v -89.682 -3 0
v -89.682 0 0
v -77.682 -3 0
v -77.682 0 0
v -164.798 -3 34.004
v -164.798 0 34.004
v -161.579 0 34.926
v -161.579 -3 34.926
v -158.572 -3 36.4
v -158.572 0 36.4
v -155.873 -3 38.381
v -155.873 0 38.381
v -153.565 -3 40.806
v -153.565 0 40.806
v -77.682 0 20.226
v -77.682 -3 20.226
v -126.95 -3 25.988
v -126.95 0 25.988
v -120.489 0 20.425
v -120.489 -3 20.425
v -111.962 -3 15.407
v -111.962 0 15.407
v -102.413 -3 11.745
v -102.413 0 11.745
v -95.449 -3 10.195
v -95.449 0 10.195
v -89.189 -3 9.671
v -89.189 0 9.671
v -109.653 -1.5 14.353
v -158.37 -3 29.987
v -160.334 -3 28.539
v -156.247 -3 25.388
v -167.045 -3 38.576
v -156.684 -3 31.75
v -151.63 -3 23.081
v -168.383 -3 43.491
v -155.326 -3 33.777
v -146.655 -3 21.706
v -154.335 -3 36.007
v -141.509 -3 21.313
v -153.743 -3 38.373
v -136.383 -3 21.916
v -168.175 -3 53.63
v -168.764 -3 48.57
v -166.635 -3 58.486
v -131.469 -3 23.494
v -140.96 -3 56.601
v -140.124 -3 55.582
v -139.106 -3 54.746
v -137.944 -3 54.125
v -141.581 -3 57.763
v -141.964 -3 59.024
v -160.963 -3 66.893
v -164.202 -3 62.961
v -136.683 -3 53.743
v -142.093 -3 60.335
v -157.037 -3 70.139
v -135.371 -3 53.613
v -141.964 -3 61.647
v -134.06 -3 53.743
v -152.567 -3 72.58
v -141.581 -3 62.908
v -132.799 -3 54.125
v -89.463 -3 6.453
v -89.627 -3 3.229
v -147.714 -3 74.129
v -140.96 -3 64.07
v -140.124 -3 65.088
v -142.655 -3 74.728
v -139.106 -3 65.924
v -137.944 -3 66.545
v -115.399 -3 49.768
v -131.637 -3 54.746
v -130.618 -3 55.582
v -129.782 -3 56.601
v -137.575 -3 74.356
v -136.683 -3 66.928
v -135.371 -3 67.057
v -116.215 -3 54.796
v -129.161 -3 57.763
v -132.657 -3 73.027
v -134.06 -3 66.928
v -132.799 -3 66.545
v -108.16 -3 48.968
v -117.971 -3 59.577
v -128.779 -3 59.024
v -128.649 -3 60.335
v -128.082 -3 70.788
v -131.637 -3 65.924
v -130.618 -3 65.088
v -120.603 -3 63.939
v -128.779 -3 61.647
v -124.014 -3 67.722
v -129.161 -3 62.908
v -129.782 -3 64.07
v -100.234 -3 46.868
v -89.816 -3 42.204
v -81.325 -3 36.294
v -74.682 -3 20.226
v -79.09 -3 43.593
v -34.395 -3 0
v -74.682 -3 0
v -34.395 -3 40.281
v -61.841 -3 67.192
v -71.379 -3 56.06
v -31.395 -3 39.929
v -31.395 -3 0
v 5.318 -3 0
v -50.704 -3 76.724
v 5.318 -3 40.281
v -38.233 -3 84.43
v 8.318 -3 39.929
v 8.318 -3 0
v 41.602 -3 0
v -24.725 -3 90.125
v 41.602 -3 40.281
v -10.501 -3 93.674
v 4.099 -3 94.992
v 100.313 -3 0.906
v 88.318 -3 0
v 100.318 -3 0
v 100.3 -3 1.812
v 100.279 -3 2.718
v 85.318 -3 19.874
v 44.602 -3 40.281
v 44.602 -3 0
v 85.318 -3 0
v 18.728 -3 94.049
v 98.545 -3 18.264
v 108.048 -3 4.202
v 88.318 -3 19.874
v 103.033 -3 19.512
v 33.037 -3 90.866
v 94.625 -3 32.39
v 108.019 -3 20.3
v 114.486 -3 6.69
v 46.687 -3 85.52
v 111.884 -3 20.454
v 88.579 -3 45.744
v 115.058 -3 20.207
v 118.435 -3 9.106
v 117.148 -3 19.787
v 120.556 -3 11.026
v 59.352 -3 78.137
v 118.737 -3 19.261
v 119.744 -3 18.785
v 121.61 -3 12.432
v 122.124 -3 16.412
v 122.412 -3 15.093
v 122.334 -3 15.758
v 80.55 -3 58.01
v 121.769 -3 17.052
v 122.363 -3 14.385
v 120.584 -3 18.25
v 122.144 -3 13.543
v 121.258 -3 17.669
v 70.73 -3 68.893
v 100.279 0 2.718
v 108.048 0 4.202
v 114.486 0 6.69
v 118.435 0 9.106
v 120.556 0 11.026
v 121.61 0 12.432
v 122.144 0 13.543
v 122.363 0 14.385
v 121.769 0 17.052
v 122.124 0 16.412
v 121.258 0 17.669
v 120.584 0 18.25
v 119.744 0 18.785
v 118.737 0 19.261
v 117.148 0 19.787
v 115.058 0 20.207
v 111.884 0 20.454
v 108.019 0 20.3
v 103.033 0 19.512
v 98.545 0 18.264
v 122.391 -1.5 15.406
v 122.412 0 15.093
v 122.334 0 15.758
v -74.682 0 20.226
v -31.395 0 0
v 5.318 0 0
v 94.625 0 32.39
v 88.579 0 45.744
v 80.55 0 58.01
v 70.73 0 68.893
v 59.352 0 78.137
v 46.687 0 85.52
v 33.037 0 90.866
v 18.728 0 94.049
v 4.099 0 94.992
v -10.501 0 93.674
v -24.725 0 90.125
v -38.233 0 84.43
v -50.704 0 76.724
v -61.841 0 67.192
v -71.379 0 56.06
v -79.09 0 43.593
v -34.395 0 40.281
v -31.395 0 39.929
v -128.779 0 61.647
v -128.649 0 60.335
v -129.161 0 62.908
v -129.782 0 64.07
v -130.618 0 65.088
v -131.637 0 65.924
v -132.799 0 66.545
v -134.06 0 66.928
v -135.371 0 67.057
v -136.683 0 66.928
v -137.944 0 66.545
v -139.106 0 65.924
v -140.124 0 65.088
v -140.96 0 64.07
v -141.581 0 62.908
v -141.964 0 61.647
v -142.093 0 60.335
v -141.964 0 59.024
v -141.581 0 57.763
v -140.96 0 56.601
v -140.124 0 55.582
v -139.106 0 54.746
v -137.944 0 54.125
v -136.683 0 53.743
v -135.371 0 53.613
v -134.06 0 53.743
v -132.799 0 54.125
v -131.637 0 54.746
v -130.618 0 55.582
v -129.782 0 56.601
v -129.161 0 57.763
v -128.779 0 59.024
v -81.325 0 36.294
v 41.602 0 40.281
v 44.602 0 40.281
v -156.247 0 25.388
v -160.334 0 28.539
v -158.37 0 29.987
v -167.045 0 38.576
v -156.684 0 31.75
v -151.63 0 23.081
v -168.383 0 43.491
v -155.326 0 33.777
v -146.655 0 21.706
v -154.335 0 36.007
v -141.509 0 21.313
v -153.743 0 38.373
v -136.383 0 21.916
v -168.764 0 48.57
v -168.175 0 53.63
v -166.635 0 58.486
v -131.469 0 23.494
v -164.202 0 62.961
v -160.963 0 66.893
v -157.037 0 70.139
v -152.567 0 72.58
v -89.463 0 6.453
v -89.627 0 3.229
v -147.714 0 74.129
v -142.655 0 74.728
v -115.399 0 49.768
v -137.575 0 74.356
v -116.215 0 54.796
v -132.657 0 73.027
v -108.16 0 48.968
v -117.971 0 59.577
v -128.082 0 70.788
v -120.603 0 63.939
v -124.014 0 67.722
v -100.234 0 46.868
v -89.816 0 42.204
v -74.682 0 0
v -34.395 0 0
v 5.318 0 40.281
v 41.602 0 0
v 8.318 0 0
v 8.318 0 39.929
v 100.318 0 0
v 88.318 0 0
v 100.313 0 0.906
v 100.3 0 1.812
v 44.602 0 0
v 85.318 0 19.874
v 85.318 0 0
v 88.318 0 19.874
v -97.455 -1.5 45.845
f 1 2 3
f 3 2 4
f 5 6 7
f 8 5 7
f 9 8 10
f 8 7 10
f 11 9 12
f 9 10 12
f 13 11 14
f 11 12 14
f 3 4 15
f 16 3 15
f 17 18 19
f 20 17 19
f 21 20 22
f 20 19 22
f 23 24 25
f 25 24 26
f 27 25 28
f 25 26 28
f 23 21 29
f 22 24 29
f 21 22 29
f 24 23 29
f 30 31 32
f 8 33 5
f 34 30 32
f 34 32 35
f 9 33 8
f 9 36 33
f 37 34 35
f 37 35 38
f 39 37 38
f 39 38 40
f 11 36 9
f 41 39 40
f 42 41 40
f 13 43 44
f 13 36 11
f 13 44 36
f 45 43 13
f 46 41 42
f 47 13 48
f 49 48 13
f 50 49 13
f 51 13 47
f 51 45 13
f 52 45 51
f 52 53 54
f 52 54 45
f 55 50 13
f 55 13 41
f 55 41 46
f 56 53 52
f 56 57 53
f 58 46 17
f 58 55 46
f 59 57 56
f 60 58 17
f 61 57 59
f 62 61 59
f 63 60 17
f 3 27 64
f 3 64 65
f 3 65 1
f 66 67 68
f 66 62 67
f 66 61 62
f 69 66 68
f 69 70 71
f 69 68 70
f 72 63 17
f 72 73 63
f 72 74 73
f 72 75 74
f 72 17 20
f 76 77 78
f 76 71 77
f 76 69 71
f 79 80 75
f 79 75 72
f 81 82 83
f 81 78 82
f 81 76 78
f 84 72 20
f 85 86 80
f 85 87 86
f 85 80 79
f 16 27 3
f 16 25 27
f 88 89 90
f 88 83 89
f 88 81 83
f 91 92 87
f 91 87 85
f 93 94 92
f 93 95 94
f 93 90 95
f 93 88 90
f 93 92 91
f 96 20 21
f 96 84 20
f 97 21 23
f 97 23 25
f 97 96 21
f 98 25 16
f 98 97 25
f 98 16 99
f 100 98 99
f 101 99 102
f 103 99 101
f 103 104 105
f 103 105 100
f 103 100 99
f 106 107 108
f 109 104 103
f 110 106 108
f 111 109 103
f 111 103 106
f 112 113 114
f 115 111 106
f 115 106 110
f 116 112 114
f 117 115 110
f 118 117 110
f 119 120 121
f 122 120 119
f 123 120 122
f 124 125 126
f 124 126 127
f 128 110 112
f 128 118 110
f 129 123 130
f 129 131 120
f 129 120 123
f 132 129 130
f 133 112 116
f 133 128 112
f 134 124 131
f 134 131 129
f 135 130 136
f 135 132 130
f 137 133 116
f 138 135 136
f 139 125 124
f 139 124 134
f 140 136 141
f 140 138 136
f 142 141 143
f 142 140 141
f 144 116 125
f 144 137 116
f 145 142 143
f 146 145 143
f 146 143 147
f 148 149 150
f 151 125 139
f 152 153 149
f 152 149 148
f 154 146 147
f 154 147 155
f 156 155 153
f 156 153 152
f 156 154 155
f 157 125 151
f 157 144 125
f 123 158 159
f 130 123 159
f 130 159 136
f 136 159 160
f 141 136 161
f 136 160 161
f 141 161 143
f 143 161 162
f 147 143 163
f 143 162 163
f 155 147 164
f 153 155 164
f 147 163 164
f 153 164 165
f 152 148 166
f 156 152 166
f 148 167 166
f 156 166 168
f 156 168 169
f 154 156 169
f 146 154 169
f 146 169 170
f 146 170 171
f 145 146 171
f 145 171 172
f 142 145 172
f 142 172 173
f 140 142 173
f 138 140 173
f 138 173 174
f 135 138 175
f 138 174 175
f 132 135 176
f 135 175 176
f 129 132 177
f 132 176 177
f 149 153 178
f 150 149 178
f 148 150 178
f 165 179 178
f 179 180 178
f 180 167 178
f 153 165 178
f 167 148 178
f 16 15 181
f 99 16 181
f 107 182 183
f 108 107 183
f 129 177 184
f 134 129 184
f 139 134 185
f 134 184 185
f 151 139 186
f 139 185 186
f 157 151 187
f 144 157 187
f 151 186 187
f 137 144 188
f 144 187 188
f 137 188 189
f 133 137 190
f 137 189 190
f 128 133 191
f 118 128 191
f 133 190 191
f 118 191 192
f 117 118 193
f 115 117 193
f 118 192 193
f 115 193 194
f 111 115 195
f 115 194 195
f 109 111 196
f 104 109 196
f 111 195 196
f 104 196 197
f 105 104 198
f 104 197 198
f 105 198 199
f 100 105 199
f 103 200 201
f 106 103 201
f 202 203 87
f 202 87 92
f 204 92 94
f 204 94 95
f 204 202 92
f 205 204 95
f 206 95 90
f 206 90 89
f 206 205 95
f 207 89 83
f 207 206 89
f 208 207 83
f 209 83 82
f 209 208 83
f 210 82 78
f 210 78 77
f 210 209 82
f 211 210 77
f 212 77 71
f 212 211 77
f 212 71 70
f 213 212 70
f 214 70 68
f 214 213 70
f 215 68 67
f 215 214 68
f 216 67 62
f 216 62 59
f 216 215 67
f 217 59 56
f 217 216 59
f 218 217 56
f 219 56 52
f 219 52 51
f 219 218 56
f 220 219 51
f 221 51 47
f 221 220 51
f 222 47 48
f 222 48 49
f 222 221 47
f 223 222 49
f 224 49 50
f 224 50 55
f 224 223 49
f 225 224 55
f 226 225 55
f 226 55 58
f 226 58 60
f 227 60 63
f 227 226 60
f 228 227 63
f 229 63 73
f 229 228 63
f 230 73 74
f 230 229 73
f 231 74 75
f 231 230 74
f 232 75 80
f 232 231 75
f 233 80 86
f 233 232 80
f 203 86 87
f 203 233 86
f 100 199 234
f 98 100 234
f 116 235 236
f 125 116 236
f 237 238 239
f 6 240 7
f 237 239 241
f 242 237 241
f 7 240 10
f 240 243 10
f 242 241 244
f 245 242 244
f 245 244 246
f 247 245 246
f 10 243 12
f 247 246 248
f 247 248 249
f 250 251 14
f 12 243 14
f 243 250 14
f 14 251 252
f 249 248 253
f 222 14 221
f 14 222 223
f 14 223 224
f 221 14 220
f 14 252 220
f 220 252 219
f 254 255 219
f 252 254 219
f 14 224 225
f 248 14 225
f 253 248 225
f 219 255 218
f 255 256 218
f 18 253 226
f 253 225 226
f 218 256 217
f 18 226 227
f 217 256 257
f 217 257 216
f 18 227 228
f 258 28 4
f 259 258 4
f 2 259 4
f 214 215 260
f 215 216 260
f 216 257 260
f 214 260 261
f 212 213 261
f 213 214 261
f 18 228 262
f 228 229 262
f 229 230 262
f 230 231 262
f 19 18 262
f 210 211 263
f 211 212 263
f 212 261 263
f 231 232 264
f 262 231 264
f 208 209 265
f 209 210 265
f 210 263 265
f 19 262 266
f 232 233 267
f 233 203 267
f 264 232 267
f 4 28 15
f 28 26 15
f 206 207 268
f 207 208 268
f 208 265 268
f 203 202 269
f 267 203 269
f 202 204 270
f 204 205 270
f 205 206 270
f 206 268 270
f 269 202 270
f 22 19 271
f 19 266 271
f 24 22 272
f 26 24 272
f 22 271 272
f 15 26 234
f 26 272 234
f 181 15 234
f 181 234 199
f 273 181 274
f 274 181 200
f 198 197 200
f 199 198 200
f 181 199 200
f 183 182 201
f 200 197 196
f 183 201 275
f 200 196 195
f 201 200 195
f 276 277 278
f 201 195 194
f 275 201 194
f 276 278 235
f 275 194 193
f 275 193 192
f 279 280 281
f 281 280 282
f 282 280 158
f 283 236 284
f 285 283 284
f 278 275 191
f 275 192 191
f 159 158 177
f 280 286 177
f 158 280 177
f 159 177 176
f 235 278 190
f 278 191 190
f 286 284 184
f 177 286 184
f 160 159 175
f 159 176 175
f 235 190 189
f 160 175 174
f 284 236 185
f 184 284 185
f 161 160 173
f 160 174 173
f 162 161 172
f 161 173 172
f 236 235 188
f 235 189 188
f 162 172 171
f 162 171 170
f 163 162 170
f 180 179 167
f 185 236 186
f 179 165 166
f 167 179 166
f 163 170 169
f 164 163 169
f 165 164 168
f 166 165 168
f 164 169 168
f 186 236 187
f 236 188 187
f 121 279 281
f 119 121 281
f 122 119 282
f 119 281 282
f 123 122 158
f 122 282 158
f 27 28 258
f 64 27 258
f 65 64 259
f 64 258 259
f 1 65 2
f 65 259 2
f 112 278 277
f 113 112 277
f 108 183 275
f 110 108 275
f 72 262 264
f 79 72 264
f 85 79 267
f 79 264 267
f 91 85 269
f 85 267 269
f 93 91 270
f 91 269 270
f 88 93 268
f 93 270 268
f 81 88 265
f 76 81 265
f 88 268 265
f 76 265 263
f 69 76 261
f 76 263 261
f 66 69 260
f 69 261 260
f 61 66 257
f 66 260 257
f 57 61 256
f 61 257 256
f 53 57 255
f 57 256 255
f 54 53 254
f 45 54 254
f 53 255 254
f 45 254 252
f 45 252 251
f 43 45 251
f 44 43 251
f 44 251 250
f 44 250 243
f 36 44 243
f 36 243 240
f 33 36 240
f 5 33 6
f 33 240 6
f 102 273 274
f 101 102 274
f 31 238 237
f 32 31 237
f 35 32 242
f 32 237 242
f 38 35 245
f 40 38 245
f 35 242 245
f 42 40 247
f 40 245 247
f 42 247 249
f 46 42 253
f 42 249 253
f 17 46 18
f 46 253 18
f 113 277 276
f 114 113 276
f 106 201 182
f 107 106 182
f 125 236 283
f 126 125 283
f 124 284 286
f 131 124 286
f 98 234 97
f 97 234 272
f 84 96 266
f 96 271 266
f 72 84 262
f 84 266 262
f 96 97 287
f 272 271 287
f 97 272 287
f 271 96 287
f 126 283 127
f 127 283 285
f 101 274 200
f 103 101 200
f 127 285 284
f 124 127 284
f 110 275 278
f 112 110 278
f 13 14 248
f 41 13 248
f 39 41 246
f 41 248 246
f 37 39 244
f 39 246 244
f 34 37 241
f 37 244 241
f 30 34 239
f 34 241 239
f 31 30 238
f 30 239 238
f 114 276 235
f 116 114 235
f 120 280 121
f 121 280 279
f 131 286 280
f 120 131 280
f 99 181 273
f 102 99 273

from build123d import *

# Parameters (mm, degrees)
F0_R     = 6.7218070384
F1_DEPTH = 3


with BuildPart() as f1:
    # F0 (on Front) → F1 (new body)
    with BuildSketch(Plane.XZ):
        with BuildLine():
            Line((88.3177022776, 0), (100.3177022776, 0))
            ThreePointArc((100.3177022776, 0), (100.3079795638, 1.3591251166), (100.2788134127, 2.7179720356))
            add(Edge.make_bspline(
                [(100.2788134127, 2.7179720356), (123.5657655158, 4.8702892654), (122.3910548507, 15.4061085671), (121.2163441856, 25.9419278688), (98.5454256048, 18.264490226)],
                knots=[4.3938313667, 4.3938313667, 4.3938313667, 6.2299356796, 6.2299356796, 8.0660399925, 8.0660399925, 8.0660399925], degree=2, weights=[1, 0.6073687139, 1, 0.6073687139, 1]))
            ThreePointArc((98.5454256048, 18.264490226), (18.727568812, 94.0487930785), (-79.0901933214, 43.5925126662))
            Line((-79.0901933214, 43.5925126662), (-81.324518094, 36.2935284559))
            add(Edge.make_bspline(
                [(-81.324518094, 36.2935284559), (-96.3555456344, 49.2548917985), (-115.3992575195, 49.7675132019)],
                knots=[1.0171703019, 1.0171703019, 1.0171703019, 2.2169508045, 2.2169508045, 2.2169508045], degree=2, weights=[1, 0.8253975787, 1]))
            ThreePointArc((-115.3992575195, 49.7675132019), (-150.1771718322, 73.4706329992), (-164.7975034476, 34.0043547921))
            ThreePointArc((-164.7975034476, 34.0043547921), (-158.5722468335, 36.4000030596), (-153.5646075249, 40.8064187332))
            ThreePointArc((-153.5646075249, 40.8064187332), (-155.3258998068, 33.776792282), (-160.3342899704, 28.5390612356))
            ThreePointArc((-160.3342899704, 28.5390612356), (-144.0915360093, 21.3846369828), (-126.9502992551, 25.9879884968))
            add(Edge.make_bspline(
                [(-126.9502992551, 25.9879884968), (-111.6991389355, 9.8614953801), (-89.1887701705, 9.6709185409)],
                knots=[4.0125769571, 4.0125769571, 4.0125769571, 5.3843103584, 5.3843103584, 5.3843103584], degree=2, weights=[1, 0.7738704182, 1]))
            ThreePointArc((-89.1887701705, 9.6709185409), (-89.5588356087, 4.8417516166), (-89.6822977224, 0))
            Line((-89.6822977224, 0), (-77.6822977224, 0))
            Line((-77.6822977224, 0), (-77.6822977224, 20.2259942889))
            Line((-77.6822977224, 20.2259942889), (-74.6822977224, 20.2259942889))
            Line((-74.6822977224, 20.2259942889), (-74.6822977224, 0))
            Line((-74.6822977224, 0), (-34.3945622444, 0))
            Line((-34.3945622444, 0), (-34.3945622444, 40.2805954218))
            Line((-34.3945622444, 40.2805954218), (-31.3945622444, 39.9287603796))
            Line((-31.3945622444, 39.9287603796), (-31.3945622444, 0))
            Line((-31.3945622444, 0), (5.3177022776, 0))
            Line((5.3177022776, 0), (5.3177022776, 40.2805954218))
            Line((5.3177022776, 40.2805954218), (8.3177022776, 39.9287603796))
            Line((8.3177022776, 39.9287603796), (8.3177022776, 0))
            Line((8.3177022776, 0), (41.6018255055, 0))
            Line((41.6018255055, 0), (41.6018255055, 40.2805954218))
            Line((41.6018255055, 40.2805954218), (44.6018255055, 40.2805954218))
            Line((44.6018255055, 40.2805954218), (44.6018255055, 0))
            Line((44.6018255055, 0), (85.3177022776, 0))
            Line((85.3177022776, 0), (85.3177022776, 19.8741611093))
            Line((85.3177022776, 19.8741611093), (88.3177022776, 19.8741611093))
            Line((88.3177022776, 19.8741611093), (88.3177022776, 0))
        make_face()
        with Locations((-135.3712379932, 60.3351965547)):
            Circle(F0_R, mode=Mode.SUBTRACT)
    extrude(amount=F1_DEPTH)


solid = f1.part
